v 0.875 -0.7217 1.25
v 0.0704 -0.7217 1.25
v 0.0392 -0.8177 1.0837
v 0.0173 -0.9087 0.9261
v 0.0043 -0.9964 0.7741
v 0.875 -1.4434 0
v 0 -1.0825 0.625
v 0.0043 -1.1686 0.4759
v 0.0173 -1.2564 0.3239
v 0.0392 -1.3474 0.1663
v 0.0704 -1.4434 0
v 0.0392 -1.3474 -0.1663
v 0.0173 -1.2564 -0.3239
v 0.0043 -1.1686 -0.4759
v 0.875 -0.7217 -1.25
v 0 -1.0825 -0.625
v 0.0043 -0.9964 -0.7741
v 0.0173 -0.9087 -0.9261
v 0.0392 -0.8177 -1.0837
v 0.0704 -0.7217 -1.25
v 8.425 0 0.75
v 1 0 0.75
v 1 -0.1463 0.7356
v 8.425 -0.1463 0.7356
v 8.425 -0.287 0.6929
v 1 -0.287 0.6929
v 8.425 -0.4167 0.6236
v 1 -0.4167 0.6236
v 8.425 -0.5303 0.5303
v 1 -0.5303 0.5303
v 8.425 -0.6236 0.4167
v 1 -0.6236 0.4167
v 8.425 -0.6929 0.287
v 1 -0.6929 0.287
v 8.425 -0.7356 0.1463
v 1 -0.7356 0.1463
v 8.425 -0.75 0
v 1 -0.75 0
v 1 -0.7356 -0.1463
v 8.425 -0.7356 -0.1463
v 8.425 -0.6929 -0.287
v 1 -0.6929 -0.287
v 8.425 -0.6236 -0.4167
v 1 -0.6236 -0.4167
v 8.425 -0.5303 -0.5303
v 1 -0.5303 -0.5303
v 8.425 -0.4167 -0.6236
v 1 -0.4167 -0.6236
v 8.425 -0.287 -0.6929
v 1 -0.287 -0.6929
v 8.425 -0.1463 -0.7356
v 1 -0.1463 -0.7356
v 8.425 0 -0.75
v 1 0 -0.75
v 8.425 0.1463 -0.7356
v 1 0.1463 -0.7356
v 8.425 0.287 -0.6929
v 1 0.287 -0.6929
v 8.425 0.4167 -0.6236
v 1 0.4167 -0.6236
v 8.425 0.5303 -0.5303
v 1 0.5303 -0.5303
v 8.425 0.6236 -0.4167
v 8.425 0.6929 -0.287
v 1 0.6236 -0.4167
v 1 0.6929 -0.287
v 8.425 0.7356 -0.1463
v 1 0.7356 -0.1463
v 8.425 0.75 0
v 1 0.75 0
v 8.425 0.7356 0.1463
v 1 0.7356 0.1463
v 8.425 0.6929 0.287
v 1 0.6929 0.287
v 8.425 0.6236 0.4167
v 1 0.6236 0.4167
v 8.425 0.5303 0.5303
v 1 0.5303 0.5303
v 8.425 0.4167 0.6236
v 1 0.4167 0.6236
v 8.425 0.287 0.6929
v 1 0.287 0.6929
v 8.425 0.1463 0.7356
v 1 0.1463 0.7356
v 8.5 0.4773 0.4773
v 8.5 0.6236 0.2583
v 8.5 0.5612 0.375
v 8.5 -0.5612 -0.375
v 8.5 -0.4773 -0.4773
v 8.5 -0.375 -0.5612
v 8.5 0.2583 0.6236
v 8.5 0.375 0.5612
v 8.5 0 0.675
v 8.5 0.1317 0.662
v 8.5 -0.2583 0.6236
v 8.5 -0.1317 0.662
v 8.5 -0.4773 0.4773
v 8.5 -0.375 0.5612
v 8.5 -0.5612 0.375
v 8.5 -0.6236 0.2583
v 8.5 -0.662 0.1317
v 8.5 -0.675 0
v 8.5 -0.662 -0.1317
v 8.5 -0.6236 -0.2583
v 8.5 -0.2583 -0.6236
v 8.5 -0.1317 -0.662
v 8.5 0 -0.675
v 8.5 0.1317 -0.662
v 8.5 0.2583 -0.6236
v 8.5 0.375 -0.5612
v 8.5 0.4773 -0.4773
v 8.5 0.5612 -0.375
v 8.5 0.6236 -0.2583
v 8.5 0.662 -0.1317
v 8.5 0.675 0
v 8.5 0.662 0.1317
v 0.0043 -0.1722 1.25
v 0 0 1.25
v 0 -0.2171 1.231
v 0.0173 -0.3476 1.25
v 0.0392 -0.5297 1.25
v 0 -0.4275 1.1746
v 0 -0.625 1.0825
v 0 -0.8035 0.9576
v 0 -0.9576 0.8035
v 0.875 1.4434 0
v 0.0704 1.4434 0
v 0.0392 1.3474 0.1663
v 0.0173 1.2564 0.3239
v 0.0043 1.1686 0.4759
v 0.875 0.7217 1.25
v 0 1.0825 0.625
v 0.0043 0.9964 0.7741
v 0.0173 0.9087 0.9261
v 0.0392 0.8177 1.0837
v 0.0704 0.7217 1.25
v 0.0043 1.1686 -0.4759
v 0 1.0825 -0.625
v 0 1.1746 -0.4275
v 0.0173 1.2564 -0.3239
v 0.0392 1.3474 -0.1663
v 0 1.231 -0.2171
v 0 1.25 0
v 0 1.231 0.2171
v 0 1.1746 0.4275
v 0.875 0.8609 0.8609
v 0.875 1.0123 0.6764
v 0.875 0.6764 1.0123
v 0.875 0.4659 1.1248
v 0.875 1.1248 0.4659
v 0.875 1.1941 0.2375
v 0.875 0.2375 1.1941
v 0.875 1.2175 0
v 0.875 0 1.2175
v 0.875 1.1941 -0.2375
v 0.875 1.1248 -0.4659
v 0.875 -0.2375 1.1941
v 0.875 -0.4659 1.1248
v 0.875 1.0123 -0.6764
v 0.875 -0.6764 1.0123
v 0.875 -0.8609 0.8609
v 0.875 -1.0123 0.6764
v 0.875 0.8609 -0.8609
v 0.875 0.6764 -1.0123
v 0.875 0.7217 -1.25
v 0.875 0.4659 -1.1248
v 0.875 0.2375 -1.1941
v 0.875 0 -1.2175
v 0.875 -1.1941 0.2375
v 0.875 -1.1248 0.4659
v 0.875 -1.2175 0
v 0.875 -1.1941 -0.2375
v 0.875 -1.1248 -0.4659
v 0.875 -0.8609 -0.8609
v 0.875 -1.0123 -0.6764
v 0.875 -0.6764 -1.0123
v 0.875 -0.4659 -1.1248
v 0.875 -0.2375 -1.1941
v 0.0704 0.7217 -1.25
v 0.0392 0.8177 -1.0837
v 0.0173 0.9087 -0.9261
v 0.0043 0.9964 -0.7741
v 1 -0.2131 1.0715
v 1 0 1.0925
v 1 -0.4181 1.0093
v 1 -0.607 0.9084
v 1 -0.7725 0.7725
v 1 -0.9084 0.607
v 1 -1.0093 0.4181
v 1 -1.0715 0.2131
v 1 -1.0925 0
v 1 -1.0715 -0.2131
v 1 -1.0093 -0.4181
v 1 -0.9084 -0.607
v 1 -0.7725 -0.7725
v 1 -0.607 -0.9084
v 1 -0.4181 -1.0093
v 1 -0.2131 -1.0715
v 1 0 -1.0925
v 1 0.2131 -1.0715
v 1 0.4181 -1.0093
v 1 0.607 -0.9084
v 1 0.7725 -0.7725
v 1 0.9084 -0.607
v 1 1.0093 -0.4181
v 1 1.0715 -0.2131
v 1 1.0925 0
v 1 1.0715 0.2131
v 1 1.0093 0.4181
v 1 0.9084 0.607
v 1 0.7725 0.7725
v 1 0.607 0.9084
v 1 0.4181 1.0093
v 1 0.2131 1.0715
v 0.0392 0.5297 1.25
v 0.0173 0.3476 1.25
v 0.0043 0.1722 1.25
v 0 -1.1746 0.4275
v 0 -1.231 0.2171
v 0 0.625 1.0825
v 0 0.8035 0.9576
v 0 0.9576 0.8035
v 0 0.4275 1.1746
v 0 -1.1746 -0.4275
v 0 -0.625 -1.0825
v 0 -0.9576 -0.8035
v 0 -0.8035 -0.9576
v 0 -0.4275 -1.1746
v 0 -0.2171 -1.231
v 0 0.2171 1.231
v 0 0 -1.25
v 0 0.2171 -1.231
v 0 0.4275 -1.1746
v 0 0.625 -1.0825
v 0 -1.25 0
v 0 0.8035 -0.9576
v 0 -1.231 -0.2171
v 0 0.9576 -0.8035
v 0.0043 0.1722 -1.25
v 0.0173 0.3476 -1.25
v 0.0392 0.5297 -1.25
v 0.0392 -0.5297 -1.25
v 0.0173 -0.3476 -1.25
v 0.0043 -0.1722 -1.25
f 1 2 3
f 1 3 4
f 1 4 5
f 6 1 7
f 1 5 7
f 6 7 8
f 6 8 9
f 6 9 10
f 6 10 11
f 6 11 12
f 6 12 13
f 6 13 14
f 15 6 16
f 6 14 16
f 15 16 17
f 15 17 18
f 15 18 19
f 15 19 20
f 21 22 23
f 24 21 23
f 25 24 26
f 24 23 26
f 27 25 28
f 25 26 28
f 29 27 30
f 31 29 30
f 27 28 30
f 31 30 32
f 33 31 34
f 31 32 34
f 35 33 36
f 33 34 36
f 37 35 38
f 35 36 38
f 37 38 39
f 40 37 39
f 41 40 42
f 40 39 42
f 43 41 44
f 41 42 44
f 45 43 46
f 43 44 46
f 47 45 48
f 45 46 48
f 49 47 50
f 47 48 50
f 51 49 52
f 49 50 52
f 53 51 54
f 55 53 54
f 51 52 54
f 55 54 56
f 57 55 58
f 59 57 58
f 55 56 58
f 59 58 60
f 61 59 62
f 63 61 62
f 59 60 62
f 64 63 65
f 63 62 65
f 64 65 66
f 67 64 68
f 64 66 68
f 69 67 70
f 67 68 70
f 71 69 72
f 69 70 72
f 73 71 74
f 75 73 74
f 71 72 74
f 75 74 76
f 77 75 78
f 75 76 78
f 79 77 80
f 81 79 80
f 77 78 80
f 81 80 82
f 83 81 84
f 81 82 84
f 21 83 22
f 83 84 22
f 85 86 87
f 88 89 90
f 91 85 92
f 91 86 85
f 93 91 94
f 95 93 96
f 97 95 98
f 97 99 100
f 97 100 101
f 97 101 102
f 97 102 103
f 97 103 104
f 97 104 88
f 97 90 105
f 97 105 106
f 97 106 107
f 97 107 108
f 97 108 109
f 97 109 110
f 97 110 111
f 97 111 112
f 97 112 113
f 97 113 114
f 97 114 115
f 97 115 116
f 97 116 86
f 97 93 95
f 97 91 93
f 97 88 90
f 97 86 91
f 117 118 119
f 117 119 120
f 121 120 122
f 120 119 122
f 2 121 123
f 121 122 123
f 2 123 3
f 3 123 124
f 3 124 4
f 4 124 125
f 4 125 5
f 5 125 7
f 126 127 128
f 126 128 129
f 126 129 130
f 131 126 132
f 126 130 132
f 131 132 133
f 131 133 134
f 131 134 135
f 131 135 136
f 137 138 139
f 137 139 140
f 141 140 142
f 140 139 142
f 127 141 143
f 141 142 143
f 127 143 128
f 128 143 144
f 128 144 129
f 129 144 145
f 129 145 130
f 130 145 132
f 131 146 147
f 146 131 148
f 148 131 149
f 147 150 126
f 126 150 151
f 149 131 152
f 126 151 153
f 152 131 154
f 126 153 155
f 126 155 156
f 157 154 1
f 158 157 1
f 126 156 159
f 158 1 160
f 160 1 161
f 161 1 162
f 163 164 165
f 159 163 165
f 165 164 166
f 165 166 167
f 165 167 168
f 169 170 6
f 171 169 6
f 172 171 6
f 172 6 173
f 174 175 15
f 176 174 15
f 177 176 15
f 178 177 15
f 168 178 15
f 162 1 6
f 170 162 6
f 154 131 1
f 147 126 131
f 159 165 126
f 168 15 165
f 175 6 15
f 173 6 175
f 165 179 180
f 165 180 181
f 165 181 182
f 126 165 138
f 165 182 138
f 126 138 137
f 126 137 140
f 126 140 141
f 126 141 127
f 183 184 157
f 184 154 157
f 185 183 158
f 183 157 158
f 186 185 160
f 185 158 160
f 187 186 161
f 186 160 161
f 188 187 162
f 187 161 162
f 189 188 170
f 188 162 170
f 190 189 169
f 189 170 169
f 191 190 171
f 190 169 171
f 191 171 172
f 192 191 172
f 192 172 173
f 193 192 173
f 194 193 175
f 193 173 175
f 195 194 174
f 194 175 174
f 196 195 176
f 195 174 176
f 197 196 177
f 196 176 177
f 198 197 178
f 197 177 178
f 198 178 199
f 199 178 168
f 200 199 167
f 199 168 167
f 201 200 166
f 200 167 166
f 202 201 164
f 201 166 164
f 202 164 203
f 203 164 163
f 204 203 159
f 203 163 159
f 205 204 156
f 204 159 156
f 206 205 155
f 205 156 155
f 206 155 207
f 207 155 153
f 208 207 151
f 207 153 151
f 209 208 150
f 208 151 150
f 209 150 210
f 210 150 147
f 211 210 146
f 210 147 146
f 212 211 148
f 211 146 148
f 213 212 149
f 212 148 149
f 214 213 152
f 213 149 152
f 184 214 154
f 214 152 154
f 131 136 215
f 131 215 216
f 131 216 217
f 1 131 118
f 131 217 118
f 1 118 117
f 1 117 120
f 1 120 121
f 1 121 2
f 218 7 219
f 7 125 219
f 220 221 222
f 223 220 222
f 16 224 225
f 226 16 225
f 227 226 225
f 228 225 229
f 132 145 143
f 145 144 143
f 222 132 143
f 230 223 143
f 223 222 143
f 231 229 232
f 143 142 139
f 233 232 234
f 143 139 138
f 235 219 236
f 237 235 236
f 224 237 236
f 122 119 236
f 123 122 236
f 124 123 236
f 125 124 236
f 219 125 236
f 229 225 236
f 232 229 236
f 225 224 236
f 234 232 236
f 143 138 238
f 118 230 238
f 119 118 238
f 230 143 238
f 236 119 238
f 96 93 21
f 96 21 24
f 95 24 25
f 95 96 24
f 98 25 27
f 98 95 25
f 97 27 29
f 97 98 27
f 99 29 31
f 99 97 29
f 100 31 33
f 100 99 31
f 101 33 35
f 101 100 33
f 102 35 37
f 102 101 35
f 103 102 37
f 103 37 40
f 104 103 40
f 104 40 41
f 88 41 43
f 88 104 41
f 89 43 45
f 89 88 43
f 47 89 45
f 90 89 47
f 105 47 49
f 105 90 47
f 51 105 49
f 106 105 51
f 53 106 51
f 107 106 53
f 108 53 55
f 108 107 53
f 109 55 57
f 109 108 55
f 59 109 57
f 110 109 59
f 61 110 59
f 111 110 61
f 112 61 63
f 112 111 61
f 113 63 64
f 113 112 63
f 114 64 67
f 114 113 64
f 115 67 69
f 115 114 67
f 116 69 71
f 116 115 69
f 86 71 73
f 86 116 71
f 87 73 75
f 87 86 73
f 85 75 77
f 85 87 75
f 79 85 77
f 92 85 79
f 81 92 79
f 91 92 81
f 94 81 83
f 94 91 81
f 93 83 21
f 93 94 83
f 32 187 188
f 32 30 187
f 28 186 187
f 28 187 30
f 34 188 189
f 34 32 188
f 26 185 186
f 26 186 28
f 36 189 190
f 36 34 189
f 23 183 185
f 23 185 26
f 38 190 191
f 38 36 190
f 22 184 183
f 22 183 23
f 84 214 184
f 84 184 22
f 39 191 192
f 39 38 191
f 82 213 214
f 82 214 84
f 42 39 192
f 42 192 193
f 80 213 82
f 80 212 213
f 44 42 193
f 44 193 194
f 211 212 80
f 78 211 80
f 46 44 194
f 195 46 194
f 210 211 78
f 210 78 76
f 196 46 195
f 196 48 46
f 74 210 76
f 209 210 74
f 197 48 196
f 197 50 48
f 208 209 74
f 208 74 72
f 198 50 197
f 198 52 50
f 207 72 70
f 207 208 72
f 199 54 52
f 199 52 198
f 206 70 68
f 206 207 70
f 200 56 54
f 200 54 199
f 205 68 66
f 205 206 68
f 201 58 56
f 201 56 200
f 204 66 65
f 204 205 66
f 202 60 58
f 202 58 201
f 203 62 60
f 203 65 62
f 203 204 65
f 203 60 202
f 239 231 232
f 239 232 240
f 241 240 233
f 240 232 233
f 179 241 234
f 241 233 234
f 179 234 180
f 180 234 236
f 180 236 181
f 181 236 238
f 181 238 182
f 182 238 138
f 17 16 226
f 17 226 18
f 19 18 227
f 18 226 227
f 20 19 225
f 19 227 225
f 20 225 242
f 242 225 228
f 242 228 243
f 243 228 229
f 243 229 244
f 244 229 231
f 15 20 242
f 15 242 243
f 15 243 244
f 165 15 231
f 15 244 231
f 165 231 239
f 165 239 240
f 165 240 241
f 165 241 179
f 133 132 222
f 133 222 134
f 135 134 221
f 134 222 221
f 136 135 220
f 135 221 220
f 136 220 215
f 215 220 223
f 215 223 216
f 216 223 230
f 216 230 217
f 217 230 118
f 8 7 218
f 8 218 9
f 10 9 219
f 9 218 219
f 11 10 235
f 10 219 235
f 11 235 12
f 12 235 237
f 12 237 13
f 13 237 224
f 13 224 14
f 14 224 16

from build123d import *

# Parameters (mm, degrees)
BASEHEAD_DEPTH = 4
SKETCH5_R      = 3
BASEBODY_DEPTH = 30
CHAMFER1_SIZE  = 0.3
SCALE_1_SCALE  = 0.25


with BuildPart() as part:
    # Sketch2 → BaseHead (new body)
    with BuildSketch(Plane(origin=(0, 0, 0), x_dir=(0, 0, -1), z_dir=(1, 0, 0))):
        Polygon((0, -5.773502692), (5, -2.886751346), (5, 2.886751346), (0, 5.773502692), (-5, 2.886751346), (-5, -2.886751346), align=None)
    extrude(amount=BASEHEAD_DEPTH)

    # Sketch3 → BearingFace (revolve, cut)
    with BuildSketch(Plane.XY, mode=Mode.PRIVATE) as bearingface_sk:
        Polygon((4, 5.773502692), (4, 4.37), (3.5, 4.87), (3.5, 5.773502692), align=None)
    revolve(bearingface_sk.sketch.rotate(Axis((-0.957090588, 0, 0), (1, 0, 0)), 90), axis=Axis((-0.957090588, 0, 0), (1, 0, 0)), mode=Mode.SUBTRACT)

    # Sketch4 → HeadChamfer (revolve, cut)
    with BuildSketch(Plane.XY):
        Polygon((0, 5.773502692), (0.281531956, 5.773502692), (0, 5), align=None)
    revolve(axis=Axis((-0.493528746, 0, 0), (1, 0, 0)), mode=Mode.SUBTRACT)

    # Sketch5 → BaseBody (add)
    with BuildSketch(Plane(origin=(4, 0, 0), x_dir=(0, 0, -1), z_dir=(1, 0, 0))):
        with Locations(Location((0, 0, 0), (0, 0, 180))):
            Circle(SKETCH5_R)
    extrude(amount=BASEBODY_DEPTH)

    # Chamfer1
    chamfer1_edges = [part.edges().sort_by_distance(p)[0] for p in [
        (34, 0, -3),
    ]]
    chamfer(chamfer1_edges, length=CHAMFER1_SIZE)


with BuildPart() as part_1:
    # 缩放比例1: scaled about (0, 0, 0)
    add(part.part.scale(SCALE_1_SCALE))


solid = part_1.part
